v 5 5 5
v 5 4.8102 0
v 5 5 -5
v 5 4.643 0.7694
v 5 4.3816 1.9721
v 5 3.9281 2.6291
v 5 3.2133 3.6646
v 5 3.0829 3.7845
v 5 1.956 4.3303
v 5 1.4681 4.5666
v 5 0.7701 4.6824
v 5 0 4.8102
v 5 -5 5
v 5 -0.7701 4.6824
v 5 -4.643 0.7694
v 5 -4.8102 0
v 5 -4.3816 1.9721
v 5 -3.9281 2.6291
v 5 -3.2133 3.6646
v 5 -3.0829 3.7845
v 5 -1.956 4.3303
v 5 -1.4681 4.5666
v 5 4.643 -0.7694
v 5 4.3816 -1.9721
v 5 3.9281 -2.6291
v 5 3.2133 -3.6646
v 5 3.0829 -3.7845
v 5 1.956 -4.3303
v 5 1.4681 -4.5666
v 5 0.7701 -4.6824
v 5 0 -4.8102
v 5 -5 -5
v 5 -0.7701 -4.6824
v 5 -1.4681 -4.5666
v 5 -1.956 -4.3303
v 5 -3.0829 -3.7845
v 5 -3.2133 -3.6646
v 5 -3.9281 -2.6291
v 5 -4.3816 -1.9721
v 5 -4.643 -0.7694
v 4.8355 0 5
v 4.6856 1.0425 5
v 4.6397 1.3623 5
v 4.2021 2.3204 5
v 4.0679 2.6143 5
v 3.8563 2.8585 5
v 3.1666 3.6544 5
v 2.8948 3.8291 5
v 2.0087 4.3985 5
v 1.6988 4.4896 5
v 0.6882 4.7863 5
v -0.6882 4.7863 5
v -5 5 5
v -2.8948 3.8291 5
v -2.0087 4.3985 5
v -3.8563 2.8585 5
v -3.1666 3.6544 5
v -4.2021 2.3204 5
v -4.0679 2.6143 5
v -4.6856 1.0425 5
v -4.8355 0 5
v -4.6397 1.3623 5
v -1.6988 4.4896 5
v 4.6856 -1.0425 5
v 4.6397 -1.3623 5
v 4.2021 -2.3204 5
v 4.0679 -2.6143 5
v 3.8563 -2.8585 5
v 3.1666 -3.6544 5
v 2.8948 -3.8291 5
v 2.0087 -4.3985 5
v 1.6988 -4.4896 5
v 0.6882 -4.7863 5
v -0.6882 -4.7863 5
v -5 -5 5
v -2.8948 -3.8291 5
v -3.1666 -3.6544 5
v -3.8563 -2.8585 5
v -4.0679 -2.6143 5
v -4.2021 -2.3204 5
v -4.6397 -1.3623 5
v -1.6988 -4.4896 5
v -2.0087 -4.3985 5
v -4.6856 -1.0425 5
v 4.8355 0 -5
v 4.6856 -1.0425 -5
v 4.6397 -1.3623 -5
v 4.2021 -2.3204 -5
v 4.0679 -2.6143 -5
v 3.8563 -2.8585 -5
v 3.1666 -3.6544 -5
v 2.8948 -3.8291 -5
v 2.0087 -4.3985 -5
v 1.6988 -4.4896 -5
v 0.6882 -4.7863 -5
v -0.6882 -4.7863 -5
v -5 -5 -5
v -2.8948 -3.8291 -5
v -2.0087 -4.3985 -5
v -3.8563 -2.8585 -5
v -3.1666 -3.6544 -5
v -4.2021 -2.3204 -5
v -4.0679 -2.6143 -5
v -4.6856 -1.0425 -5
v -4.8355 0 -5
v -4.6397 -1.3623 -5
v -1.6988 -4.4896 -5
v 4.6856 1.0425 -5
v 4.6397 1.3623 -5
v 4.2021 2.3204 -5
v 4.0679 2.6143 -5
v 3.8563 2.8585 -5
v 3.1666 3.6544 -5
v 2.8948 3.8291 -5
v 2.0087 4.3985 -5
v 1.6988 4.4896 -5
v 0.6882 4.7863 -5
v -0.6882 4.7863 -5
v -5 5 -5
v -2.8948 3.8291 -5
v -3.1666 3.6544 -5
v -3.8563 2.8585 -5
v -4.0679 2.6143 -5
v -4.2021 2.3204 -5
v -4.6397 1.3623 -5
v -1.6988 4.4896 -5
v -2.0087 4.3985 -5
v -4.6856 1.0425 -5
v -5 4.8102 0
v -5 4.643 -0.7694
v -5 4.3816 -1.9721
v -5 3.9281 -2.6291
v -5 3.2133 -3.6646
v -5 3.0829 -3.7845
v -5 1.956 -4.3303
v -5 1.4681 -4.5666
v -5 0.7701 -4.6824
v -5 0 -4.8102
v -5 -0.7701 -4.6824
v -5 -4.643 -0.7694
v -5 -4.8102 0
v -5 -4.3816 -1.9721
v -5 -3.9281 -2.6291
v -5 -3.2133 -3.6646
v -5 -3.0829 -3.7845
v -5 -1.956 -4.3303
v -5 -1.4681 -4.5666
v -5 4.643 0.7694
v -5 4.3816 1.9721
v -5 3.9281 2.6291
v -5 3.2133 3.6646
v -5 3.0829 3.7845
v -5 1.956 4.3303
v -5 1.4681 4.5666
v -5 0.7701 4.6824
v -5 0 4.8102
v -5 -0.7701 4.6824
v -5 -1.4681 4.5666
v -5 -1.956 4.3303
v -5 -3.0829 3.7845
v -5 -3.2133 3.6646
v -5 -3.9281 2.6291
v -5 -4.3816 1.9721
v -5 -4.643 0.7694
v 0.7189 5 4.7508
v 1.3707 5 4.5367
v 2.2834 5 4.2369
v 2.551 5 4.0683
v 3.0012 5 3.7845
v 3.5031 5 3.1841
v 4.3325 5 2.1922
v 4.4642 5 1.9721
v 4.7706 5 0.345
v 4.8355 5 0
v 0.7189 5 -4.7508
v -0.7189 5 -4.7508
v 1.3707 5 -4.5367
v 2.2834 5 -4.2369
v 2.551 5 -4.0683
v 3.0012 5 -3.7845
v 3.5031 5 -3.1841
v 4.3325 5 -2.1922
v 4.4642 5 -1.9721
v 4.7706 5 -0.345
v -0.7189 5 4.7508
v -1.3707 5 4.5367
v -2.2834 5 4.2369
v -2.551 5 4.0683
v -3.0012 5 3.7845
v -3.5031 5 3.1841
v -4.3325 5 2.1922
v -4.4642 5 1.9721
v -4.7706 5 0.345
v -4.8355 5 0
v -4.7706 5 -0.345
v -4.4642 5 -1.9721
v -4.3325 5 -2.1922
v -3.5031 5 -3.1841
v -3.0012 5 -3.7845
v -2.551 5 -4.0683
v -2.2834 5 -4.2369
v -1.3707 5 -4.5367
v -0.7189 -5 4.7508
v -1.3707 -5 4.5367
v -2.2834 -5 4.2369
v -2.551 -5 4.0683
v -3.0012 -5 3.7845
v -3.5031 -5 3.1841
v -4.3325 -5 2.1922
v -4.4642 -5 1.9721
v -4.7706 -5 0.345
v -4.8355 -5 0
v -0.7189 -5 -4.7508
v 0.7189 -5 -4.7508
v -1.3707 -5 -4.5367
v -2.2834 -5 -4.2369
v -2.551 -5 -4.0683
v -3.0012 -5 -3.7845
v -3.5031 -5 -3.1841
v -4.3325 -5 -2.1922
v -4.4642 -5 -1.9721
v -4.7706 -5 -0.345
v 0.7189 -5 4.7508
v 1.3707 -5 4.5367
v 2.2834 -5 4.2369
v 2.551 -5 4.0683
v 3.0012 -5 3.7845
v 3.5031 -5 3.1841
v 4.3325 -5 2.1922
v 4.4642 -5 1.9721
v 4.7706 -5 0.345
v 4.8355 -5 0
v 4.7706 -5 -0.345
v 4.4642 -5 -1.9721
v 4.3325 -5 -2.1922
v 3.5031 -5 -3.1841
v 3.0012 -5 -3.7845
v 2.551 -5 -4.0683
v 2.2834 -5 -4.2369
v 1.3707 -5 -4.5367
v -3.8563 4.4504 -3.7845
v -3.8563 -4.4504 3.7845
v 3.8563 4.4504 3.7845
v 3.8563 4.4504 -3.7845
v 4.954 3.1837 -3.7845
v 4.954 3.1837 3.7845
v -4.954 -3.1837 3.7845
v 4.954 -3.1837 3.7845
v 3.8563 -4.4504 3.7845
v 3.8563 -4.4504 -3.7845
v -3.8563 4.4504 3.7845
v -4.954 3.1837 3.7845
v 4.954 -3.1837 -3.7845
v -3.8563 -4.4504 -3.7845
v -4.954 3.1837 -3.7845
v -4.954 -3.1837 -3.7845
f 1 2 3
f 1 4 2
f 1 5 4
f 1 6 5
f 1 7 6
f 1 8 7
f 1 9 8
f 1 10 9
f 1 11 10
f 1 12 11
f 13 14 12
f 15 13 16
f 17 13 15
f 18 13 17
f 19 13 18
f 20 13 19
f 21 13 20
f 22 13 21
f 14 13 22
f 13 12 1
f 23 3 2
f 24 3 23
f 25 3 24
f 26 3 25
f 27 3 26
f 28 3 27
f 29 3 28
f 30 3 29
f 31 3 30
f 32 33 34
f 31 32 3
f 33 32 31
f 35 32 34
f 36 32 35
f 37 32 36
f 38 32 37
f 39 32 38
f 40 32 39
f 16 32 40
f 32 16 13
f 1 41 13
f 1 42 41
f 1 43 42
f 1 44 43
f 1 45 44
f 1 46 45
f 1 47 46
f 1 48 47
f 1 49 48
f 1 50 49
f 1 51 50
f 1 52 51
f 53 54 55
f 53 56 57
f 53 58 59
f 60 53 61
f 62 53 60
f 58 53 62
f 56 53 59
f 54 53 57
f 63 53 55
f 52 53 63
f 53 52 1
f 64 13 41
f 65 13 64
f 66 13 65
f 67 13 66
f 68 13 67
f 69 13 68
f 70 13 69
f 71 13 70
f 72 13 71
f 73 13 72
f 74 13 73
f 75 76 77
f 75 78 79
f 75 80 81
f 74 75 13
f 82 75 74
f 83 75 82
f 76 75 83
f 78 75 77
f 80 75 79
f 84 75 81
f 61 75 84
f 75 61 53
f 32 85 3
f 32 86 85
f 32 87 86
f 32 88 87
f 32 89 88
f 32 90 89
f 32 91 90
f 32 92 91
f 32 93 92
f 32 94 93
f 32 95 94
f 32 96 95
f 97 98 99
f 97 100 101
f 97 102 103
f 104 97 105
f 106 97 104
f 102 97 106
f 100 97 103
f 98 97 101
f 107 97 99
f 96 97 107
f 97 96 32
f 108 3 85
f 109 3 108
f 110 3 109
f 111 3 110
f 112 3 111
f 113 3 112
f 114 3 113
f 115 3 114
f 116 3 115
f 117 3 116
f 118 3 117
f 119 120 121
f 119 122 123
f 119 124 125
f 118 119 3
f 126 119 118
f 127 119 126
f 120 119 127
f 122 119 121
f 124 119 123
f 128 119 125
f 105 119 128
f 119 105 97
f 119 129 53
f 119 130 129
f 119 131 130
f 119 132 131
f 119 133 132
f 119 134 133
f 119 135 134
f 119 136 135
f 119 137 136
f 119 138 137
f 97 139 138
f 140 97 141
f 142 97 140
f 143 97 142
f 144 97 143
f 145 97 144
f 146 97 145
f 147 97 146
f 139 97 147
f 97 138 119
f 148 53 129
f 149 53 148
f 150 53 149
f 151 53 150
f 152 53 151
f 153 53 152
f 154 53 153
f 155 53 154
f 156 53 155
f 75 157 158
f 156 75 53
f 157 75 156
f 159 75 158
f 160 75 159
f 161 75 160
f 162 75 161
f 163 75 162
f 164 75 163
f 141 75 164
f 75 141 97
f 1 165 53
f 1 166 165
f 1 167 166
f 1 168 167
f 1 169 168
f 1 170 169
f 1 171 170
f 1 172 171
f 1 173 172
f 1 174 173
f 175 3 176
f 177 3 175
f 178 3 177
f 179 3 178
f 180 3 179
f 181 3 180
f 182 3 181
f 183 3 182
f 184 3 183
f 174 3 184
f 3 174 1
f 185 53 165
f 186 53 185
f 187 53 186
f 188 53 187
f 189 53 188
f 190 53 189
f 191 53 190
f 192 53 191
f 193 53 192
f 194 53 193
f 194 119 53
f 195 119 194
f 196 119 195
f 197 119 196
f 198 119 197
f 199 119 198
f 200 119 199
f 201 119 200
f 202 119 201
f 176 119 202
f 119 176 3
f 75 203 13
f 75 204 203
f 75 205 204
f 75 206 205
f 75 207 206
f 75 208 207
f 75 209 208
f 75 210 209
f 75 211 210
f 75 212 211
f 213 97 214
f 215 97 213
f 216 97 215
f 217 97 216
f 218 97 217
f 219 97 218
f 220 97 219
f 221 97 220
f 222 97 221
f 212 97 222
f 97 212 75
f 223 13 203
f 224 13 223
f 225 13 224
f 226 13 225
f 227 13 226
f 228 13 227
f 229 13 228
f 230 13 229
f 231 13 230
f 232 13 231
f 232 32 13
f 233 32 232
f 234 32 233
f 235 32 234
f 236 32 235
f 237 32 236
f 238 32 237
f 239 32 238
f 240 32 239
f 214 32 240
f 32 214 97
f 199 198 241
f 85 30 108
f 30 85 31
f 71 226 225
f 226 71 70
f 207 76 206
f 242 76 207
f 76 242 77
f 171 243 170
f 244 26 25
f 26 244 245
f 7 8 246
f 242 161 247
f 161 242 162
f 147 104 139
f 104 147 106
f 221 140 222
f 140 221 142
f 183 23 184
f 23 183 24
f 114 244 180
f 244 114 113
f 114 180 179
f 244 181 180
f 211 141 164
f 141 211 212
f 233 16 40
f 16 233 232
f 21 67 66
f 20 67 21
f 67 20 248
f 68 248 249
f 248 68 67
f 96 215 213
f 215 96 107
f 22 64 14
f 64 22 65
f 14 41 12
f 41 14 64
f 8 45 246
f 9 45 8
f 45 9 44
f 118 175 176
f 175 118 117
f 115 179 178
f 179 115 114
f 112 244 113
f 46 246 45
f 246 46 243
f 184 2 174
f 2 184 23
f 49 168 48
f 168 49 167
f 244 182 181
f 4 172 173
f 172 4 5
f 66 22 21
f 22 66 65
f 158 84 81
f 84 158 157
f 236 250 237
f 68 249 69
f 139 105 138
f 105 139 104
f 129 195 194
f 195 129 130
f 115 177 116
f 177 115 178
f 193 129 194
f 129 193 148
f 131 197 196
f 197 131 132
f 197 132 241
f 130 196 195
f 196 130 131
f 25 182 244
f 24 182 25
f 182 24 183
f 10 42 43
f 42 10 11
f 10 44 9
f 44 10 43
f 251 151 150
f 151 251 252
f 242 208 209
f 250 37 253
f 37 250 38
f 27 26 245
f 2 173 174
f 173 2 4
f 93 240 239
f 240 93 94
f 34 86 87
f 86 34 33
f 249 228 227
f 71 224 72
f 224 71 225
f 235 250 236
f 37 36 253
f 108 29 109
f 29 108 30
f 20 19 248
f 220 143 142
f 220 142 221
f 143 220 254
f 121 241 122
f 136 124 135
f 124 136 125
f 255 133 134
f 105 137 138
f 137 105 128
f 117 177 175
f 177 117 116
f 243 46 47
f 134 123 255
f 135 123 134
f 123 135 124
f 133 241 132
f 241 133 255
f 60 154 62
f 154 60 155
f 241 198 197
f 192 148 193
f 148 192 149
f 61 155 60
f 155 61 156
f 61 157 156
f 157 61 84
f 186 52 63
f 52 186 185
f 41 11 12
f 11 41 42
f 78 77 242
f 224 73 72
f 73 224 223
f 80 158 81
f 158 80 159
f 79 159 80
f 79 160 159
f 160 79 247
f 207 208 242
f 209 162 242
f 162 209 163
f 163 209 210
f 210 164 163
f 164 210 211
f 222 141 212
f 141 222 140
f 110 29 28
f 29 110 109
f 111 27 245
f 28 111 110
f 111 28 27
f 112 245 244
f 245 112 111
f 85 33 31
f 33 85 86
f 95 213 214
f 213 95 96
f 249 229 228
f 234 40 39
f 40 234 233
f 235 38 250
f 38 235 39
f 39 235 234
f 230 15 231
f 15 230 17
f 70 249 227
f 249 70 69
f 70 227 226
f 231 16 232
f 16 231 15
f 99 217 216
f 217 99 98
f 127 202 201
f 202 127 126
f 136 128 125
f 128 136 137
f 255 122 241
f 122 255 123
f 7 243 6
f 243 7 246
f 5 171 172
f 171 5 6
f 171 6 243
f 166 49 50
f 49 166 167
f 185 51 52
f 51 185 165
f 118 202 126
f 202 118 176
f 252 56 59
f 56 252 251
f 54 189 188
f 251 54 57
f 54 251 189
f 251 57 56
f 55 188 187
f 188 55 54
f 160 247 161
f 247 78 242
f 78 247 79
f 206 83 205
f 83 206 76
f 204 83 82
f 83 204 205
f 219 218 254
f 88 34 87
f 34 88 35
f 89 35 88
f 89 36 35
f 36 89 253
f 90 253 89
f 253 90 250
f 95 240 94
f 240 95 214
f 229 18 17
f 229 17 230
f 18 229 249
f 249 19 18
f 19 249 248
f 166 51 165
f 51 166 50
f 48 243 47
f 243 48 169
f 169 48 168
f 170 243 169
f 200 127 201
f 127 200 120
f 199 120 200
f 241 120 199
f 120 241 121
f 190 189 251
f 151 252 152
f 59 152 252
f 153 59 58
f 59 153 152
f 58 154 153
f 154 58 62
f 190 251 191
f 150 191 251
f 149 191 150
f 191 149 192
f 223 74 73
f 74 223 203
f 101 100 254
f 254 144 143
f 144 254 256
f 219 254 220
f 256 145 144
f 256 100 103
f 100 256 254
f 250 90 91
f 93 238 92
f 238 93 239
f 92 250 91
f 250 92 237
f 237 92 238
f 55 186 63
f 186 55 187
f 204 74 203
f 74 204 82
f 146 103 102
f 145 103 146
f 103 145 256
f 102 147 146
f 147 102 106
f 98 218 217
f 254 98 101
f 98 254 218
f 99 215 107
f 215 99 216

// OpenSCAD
difference()
{
	cube( [10, 10, 10], center=true);
	sphere( r = 7, center=true);
}
